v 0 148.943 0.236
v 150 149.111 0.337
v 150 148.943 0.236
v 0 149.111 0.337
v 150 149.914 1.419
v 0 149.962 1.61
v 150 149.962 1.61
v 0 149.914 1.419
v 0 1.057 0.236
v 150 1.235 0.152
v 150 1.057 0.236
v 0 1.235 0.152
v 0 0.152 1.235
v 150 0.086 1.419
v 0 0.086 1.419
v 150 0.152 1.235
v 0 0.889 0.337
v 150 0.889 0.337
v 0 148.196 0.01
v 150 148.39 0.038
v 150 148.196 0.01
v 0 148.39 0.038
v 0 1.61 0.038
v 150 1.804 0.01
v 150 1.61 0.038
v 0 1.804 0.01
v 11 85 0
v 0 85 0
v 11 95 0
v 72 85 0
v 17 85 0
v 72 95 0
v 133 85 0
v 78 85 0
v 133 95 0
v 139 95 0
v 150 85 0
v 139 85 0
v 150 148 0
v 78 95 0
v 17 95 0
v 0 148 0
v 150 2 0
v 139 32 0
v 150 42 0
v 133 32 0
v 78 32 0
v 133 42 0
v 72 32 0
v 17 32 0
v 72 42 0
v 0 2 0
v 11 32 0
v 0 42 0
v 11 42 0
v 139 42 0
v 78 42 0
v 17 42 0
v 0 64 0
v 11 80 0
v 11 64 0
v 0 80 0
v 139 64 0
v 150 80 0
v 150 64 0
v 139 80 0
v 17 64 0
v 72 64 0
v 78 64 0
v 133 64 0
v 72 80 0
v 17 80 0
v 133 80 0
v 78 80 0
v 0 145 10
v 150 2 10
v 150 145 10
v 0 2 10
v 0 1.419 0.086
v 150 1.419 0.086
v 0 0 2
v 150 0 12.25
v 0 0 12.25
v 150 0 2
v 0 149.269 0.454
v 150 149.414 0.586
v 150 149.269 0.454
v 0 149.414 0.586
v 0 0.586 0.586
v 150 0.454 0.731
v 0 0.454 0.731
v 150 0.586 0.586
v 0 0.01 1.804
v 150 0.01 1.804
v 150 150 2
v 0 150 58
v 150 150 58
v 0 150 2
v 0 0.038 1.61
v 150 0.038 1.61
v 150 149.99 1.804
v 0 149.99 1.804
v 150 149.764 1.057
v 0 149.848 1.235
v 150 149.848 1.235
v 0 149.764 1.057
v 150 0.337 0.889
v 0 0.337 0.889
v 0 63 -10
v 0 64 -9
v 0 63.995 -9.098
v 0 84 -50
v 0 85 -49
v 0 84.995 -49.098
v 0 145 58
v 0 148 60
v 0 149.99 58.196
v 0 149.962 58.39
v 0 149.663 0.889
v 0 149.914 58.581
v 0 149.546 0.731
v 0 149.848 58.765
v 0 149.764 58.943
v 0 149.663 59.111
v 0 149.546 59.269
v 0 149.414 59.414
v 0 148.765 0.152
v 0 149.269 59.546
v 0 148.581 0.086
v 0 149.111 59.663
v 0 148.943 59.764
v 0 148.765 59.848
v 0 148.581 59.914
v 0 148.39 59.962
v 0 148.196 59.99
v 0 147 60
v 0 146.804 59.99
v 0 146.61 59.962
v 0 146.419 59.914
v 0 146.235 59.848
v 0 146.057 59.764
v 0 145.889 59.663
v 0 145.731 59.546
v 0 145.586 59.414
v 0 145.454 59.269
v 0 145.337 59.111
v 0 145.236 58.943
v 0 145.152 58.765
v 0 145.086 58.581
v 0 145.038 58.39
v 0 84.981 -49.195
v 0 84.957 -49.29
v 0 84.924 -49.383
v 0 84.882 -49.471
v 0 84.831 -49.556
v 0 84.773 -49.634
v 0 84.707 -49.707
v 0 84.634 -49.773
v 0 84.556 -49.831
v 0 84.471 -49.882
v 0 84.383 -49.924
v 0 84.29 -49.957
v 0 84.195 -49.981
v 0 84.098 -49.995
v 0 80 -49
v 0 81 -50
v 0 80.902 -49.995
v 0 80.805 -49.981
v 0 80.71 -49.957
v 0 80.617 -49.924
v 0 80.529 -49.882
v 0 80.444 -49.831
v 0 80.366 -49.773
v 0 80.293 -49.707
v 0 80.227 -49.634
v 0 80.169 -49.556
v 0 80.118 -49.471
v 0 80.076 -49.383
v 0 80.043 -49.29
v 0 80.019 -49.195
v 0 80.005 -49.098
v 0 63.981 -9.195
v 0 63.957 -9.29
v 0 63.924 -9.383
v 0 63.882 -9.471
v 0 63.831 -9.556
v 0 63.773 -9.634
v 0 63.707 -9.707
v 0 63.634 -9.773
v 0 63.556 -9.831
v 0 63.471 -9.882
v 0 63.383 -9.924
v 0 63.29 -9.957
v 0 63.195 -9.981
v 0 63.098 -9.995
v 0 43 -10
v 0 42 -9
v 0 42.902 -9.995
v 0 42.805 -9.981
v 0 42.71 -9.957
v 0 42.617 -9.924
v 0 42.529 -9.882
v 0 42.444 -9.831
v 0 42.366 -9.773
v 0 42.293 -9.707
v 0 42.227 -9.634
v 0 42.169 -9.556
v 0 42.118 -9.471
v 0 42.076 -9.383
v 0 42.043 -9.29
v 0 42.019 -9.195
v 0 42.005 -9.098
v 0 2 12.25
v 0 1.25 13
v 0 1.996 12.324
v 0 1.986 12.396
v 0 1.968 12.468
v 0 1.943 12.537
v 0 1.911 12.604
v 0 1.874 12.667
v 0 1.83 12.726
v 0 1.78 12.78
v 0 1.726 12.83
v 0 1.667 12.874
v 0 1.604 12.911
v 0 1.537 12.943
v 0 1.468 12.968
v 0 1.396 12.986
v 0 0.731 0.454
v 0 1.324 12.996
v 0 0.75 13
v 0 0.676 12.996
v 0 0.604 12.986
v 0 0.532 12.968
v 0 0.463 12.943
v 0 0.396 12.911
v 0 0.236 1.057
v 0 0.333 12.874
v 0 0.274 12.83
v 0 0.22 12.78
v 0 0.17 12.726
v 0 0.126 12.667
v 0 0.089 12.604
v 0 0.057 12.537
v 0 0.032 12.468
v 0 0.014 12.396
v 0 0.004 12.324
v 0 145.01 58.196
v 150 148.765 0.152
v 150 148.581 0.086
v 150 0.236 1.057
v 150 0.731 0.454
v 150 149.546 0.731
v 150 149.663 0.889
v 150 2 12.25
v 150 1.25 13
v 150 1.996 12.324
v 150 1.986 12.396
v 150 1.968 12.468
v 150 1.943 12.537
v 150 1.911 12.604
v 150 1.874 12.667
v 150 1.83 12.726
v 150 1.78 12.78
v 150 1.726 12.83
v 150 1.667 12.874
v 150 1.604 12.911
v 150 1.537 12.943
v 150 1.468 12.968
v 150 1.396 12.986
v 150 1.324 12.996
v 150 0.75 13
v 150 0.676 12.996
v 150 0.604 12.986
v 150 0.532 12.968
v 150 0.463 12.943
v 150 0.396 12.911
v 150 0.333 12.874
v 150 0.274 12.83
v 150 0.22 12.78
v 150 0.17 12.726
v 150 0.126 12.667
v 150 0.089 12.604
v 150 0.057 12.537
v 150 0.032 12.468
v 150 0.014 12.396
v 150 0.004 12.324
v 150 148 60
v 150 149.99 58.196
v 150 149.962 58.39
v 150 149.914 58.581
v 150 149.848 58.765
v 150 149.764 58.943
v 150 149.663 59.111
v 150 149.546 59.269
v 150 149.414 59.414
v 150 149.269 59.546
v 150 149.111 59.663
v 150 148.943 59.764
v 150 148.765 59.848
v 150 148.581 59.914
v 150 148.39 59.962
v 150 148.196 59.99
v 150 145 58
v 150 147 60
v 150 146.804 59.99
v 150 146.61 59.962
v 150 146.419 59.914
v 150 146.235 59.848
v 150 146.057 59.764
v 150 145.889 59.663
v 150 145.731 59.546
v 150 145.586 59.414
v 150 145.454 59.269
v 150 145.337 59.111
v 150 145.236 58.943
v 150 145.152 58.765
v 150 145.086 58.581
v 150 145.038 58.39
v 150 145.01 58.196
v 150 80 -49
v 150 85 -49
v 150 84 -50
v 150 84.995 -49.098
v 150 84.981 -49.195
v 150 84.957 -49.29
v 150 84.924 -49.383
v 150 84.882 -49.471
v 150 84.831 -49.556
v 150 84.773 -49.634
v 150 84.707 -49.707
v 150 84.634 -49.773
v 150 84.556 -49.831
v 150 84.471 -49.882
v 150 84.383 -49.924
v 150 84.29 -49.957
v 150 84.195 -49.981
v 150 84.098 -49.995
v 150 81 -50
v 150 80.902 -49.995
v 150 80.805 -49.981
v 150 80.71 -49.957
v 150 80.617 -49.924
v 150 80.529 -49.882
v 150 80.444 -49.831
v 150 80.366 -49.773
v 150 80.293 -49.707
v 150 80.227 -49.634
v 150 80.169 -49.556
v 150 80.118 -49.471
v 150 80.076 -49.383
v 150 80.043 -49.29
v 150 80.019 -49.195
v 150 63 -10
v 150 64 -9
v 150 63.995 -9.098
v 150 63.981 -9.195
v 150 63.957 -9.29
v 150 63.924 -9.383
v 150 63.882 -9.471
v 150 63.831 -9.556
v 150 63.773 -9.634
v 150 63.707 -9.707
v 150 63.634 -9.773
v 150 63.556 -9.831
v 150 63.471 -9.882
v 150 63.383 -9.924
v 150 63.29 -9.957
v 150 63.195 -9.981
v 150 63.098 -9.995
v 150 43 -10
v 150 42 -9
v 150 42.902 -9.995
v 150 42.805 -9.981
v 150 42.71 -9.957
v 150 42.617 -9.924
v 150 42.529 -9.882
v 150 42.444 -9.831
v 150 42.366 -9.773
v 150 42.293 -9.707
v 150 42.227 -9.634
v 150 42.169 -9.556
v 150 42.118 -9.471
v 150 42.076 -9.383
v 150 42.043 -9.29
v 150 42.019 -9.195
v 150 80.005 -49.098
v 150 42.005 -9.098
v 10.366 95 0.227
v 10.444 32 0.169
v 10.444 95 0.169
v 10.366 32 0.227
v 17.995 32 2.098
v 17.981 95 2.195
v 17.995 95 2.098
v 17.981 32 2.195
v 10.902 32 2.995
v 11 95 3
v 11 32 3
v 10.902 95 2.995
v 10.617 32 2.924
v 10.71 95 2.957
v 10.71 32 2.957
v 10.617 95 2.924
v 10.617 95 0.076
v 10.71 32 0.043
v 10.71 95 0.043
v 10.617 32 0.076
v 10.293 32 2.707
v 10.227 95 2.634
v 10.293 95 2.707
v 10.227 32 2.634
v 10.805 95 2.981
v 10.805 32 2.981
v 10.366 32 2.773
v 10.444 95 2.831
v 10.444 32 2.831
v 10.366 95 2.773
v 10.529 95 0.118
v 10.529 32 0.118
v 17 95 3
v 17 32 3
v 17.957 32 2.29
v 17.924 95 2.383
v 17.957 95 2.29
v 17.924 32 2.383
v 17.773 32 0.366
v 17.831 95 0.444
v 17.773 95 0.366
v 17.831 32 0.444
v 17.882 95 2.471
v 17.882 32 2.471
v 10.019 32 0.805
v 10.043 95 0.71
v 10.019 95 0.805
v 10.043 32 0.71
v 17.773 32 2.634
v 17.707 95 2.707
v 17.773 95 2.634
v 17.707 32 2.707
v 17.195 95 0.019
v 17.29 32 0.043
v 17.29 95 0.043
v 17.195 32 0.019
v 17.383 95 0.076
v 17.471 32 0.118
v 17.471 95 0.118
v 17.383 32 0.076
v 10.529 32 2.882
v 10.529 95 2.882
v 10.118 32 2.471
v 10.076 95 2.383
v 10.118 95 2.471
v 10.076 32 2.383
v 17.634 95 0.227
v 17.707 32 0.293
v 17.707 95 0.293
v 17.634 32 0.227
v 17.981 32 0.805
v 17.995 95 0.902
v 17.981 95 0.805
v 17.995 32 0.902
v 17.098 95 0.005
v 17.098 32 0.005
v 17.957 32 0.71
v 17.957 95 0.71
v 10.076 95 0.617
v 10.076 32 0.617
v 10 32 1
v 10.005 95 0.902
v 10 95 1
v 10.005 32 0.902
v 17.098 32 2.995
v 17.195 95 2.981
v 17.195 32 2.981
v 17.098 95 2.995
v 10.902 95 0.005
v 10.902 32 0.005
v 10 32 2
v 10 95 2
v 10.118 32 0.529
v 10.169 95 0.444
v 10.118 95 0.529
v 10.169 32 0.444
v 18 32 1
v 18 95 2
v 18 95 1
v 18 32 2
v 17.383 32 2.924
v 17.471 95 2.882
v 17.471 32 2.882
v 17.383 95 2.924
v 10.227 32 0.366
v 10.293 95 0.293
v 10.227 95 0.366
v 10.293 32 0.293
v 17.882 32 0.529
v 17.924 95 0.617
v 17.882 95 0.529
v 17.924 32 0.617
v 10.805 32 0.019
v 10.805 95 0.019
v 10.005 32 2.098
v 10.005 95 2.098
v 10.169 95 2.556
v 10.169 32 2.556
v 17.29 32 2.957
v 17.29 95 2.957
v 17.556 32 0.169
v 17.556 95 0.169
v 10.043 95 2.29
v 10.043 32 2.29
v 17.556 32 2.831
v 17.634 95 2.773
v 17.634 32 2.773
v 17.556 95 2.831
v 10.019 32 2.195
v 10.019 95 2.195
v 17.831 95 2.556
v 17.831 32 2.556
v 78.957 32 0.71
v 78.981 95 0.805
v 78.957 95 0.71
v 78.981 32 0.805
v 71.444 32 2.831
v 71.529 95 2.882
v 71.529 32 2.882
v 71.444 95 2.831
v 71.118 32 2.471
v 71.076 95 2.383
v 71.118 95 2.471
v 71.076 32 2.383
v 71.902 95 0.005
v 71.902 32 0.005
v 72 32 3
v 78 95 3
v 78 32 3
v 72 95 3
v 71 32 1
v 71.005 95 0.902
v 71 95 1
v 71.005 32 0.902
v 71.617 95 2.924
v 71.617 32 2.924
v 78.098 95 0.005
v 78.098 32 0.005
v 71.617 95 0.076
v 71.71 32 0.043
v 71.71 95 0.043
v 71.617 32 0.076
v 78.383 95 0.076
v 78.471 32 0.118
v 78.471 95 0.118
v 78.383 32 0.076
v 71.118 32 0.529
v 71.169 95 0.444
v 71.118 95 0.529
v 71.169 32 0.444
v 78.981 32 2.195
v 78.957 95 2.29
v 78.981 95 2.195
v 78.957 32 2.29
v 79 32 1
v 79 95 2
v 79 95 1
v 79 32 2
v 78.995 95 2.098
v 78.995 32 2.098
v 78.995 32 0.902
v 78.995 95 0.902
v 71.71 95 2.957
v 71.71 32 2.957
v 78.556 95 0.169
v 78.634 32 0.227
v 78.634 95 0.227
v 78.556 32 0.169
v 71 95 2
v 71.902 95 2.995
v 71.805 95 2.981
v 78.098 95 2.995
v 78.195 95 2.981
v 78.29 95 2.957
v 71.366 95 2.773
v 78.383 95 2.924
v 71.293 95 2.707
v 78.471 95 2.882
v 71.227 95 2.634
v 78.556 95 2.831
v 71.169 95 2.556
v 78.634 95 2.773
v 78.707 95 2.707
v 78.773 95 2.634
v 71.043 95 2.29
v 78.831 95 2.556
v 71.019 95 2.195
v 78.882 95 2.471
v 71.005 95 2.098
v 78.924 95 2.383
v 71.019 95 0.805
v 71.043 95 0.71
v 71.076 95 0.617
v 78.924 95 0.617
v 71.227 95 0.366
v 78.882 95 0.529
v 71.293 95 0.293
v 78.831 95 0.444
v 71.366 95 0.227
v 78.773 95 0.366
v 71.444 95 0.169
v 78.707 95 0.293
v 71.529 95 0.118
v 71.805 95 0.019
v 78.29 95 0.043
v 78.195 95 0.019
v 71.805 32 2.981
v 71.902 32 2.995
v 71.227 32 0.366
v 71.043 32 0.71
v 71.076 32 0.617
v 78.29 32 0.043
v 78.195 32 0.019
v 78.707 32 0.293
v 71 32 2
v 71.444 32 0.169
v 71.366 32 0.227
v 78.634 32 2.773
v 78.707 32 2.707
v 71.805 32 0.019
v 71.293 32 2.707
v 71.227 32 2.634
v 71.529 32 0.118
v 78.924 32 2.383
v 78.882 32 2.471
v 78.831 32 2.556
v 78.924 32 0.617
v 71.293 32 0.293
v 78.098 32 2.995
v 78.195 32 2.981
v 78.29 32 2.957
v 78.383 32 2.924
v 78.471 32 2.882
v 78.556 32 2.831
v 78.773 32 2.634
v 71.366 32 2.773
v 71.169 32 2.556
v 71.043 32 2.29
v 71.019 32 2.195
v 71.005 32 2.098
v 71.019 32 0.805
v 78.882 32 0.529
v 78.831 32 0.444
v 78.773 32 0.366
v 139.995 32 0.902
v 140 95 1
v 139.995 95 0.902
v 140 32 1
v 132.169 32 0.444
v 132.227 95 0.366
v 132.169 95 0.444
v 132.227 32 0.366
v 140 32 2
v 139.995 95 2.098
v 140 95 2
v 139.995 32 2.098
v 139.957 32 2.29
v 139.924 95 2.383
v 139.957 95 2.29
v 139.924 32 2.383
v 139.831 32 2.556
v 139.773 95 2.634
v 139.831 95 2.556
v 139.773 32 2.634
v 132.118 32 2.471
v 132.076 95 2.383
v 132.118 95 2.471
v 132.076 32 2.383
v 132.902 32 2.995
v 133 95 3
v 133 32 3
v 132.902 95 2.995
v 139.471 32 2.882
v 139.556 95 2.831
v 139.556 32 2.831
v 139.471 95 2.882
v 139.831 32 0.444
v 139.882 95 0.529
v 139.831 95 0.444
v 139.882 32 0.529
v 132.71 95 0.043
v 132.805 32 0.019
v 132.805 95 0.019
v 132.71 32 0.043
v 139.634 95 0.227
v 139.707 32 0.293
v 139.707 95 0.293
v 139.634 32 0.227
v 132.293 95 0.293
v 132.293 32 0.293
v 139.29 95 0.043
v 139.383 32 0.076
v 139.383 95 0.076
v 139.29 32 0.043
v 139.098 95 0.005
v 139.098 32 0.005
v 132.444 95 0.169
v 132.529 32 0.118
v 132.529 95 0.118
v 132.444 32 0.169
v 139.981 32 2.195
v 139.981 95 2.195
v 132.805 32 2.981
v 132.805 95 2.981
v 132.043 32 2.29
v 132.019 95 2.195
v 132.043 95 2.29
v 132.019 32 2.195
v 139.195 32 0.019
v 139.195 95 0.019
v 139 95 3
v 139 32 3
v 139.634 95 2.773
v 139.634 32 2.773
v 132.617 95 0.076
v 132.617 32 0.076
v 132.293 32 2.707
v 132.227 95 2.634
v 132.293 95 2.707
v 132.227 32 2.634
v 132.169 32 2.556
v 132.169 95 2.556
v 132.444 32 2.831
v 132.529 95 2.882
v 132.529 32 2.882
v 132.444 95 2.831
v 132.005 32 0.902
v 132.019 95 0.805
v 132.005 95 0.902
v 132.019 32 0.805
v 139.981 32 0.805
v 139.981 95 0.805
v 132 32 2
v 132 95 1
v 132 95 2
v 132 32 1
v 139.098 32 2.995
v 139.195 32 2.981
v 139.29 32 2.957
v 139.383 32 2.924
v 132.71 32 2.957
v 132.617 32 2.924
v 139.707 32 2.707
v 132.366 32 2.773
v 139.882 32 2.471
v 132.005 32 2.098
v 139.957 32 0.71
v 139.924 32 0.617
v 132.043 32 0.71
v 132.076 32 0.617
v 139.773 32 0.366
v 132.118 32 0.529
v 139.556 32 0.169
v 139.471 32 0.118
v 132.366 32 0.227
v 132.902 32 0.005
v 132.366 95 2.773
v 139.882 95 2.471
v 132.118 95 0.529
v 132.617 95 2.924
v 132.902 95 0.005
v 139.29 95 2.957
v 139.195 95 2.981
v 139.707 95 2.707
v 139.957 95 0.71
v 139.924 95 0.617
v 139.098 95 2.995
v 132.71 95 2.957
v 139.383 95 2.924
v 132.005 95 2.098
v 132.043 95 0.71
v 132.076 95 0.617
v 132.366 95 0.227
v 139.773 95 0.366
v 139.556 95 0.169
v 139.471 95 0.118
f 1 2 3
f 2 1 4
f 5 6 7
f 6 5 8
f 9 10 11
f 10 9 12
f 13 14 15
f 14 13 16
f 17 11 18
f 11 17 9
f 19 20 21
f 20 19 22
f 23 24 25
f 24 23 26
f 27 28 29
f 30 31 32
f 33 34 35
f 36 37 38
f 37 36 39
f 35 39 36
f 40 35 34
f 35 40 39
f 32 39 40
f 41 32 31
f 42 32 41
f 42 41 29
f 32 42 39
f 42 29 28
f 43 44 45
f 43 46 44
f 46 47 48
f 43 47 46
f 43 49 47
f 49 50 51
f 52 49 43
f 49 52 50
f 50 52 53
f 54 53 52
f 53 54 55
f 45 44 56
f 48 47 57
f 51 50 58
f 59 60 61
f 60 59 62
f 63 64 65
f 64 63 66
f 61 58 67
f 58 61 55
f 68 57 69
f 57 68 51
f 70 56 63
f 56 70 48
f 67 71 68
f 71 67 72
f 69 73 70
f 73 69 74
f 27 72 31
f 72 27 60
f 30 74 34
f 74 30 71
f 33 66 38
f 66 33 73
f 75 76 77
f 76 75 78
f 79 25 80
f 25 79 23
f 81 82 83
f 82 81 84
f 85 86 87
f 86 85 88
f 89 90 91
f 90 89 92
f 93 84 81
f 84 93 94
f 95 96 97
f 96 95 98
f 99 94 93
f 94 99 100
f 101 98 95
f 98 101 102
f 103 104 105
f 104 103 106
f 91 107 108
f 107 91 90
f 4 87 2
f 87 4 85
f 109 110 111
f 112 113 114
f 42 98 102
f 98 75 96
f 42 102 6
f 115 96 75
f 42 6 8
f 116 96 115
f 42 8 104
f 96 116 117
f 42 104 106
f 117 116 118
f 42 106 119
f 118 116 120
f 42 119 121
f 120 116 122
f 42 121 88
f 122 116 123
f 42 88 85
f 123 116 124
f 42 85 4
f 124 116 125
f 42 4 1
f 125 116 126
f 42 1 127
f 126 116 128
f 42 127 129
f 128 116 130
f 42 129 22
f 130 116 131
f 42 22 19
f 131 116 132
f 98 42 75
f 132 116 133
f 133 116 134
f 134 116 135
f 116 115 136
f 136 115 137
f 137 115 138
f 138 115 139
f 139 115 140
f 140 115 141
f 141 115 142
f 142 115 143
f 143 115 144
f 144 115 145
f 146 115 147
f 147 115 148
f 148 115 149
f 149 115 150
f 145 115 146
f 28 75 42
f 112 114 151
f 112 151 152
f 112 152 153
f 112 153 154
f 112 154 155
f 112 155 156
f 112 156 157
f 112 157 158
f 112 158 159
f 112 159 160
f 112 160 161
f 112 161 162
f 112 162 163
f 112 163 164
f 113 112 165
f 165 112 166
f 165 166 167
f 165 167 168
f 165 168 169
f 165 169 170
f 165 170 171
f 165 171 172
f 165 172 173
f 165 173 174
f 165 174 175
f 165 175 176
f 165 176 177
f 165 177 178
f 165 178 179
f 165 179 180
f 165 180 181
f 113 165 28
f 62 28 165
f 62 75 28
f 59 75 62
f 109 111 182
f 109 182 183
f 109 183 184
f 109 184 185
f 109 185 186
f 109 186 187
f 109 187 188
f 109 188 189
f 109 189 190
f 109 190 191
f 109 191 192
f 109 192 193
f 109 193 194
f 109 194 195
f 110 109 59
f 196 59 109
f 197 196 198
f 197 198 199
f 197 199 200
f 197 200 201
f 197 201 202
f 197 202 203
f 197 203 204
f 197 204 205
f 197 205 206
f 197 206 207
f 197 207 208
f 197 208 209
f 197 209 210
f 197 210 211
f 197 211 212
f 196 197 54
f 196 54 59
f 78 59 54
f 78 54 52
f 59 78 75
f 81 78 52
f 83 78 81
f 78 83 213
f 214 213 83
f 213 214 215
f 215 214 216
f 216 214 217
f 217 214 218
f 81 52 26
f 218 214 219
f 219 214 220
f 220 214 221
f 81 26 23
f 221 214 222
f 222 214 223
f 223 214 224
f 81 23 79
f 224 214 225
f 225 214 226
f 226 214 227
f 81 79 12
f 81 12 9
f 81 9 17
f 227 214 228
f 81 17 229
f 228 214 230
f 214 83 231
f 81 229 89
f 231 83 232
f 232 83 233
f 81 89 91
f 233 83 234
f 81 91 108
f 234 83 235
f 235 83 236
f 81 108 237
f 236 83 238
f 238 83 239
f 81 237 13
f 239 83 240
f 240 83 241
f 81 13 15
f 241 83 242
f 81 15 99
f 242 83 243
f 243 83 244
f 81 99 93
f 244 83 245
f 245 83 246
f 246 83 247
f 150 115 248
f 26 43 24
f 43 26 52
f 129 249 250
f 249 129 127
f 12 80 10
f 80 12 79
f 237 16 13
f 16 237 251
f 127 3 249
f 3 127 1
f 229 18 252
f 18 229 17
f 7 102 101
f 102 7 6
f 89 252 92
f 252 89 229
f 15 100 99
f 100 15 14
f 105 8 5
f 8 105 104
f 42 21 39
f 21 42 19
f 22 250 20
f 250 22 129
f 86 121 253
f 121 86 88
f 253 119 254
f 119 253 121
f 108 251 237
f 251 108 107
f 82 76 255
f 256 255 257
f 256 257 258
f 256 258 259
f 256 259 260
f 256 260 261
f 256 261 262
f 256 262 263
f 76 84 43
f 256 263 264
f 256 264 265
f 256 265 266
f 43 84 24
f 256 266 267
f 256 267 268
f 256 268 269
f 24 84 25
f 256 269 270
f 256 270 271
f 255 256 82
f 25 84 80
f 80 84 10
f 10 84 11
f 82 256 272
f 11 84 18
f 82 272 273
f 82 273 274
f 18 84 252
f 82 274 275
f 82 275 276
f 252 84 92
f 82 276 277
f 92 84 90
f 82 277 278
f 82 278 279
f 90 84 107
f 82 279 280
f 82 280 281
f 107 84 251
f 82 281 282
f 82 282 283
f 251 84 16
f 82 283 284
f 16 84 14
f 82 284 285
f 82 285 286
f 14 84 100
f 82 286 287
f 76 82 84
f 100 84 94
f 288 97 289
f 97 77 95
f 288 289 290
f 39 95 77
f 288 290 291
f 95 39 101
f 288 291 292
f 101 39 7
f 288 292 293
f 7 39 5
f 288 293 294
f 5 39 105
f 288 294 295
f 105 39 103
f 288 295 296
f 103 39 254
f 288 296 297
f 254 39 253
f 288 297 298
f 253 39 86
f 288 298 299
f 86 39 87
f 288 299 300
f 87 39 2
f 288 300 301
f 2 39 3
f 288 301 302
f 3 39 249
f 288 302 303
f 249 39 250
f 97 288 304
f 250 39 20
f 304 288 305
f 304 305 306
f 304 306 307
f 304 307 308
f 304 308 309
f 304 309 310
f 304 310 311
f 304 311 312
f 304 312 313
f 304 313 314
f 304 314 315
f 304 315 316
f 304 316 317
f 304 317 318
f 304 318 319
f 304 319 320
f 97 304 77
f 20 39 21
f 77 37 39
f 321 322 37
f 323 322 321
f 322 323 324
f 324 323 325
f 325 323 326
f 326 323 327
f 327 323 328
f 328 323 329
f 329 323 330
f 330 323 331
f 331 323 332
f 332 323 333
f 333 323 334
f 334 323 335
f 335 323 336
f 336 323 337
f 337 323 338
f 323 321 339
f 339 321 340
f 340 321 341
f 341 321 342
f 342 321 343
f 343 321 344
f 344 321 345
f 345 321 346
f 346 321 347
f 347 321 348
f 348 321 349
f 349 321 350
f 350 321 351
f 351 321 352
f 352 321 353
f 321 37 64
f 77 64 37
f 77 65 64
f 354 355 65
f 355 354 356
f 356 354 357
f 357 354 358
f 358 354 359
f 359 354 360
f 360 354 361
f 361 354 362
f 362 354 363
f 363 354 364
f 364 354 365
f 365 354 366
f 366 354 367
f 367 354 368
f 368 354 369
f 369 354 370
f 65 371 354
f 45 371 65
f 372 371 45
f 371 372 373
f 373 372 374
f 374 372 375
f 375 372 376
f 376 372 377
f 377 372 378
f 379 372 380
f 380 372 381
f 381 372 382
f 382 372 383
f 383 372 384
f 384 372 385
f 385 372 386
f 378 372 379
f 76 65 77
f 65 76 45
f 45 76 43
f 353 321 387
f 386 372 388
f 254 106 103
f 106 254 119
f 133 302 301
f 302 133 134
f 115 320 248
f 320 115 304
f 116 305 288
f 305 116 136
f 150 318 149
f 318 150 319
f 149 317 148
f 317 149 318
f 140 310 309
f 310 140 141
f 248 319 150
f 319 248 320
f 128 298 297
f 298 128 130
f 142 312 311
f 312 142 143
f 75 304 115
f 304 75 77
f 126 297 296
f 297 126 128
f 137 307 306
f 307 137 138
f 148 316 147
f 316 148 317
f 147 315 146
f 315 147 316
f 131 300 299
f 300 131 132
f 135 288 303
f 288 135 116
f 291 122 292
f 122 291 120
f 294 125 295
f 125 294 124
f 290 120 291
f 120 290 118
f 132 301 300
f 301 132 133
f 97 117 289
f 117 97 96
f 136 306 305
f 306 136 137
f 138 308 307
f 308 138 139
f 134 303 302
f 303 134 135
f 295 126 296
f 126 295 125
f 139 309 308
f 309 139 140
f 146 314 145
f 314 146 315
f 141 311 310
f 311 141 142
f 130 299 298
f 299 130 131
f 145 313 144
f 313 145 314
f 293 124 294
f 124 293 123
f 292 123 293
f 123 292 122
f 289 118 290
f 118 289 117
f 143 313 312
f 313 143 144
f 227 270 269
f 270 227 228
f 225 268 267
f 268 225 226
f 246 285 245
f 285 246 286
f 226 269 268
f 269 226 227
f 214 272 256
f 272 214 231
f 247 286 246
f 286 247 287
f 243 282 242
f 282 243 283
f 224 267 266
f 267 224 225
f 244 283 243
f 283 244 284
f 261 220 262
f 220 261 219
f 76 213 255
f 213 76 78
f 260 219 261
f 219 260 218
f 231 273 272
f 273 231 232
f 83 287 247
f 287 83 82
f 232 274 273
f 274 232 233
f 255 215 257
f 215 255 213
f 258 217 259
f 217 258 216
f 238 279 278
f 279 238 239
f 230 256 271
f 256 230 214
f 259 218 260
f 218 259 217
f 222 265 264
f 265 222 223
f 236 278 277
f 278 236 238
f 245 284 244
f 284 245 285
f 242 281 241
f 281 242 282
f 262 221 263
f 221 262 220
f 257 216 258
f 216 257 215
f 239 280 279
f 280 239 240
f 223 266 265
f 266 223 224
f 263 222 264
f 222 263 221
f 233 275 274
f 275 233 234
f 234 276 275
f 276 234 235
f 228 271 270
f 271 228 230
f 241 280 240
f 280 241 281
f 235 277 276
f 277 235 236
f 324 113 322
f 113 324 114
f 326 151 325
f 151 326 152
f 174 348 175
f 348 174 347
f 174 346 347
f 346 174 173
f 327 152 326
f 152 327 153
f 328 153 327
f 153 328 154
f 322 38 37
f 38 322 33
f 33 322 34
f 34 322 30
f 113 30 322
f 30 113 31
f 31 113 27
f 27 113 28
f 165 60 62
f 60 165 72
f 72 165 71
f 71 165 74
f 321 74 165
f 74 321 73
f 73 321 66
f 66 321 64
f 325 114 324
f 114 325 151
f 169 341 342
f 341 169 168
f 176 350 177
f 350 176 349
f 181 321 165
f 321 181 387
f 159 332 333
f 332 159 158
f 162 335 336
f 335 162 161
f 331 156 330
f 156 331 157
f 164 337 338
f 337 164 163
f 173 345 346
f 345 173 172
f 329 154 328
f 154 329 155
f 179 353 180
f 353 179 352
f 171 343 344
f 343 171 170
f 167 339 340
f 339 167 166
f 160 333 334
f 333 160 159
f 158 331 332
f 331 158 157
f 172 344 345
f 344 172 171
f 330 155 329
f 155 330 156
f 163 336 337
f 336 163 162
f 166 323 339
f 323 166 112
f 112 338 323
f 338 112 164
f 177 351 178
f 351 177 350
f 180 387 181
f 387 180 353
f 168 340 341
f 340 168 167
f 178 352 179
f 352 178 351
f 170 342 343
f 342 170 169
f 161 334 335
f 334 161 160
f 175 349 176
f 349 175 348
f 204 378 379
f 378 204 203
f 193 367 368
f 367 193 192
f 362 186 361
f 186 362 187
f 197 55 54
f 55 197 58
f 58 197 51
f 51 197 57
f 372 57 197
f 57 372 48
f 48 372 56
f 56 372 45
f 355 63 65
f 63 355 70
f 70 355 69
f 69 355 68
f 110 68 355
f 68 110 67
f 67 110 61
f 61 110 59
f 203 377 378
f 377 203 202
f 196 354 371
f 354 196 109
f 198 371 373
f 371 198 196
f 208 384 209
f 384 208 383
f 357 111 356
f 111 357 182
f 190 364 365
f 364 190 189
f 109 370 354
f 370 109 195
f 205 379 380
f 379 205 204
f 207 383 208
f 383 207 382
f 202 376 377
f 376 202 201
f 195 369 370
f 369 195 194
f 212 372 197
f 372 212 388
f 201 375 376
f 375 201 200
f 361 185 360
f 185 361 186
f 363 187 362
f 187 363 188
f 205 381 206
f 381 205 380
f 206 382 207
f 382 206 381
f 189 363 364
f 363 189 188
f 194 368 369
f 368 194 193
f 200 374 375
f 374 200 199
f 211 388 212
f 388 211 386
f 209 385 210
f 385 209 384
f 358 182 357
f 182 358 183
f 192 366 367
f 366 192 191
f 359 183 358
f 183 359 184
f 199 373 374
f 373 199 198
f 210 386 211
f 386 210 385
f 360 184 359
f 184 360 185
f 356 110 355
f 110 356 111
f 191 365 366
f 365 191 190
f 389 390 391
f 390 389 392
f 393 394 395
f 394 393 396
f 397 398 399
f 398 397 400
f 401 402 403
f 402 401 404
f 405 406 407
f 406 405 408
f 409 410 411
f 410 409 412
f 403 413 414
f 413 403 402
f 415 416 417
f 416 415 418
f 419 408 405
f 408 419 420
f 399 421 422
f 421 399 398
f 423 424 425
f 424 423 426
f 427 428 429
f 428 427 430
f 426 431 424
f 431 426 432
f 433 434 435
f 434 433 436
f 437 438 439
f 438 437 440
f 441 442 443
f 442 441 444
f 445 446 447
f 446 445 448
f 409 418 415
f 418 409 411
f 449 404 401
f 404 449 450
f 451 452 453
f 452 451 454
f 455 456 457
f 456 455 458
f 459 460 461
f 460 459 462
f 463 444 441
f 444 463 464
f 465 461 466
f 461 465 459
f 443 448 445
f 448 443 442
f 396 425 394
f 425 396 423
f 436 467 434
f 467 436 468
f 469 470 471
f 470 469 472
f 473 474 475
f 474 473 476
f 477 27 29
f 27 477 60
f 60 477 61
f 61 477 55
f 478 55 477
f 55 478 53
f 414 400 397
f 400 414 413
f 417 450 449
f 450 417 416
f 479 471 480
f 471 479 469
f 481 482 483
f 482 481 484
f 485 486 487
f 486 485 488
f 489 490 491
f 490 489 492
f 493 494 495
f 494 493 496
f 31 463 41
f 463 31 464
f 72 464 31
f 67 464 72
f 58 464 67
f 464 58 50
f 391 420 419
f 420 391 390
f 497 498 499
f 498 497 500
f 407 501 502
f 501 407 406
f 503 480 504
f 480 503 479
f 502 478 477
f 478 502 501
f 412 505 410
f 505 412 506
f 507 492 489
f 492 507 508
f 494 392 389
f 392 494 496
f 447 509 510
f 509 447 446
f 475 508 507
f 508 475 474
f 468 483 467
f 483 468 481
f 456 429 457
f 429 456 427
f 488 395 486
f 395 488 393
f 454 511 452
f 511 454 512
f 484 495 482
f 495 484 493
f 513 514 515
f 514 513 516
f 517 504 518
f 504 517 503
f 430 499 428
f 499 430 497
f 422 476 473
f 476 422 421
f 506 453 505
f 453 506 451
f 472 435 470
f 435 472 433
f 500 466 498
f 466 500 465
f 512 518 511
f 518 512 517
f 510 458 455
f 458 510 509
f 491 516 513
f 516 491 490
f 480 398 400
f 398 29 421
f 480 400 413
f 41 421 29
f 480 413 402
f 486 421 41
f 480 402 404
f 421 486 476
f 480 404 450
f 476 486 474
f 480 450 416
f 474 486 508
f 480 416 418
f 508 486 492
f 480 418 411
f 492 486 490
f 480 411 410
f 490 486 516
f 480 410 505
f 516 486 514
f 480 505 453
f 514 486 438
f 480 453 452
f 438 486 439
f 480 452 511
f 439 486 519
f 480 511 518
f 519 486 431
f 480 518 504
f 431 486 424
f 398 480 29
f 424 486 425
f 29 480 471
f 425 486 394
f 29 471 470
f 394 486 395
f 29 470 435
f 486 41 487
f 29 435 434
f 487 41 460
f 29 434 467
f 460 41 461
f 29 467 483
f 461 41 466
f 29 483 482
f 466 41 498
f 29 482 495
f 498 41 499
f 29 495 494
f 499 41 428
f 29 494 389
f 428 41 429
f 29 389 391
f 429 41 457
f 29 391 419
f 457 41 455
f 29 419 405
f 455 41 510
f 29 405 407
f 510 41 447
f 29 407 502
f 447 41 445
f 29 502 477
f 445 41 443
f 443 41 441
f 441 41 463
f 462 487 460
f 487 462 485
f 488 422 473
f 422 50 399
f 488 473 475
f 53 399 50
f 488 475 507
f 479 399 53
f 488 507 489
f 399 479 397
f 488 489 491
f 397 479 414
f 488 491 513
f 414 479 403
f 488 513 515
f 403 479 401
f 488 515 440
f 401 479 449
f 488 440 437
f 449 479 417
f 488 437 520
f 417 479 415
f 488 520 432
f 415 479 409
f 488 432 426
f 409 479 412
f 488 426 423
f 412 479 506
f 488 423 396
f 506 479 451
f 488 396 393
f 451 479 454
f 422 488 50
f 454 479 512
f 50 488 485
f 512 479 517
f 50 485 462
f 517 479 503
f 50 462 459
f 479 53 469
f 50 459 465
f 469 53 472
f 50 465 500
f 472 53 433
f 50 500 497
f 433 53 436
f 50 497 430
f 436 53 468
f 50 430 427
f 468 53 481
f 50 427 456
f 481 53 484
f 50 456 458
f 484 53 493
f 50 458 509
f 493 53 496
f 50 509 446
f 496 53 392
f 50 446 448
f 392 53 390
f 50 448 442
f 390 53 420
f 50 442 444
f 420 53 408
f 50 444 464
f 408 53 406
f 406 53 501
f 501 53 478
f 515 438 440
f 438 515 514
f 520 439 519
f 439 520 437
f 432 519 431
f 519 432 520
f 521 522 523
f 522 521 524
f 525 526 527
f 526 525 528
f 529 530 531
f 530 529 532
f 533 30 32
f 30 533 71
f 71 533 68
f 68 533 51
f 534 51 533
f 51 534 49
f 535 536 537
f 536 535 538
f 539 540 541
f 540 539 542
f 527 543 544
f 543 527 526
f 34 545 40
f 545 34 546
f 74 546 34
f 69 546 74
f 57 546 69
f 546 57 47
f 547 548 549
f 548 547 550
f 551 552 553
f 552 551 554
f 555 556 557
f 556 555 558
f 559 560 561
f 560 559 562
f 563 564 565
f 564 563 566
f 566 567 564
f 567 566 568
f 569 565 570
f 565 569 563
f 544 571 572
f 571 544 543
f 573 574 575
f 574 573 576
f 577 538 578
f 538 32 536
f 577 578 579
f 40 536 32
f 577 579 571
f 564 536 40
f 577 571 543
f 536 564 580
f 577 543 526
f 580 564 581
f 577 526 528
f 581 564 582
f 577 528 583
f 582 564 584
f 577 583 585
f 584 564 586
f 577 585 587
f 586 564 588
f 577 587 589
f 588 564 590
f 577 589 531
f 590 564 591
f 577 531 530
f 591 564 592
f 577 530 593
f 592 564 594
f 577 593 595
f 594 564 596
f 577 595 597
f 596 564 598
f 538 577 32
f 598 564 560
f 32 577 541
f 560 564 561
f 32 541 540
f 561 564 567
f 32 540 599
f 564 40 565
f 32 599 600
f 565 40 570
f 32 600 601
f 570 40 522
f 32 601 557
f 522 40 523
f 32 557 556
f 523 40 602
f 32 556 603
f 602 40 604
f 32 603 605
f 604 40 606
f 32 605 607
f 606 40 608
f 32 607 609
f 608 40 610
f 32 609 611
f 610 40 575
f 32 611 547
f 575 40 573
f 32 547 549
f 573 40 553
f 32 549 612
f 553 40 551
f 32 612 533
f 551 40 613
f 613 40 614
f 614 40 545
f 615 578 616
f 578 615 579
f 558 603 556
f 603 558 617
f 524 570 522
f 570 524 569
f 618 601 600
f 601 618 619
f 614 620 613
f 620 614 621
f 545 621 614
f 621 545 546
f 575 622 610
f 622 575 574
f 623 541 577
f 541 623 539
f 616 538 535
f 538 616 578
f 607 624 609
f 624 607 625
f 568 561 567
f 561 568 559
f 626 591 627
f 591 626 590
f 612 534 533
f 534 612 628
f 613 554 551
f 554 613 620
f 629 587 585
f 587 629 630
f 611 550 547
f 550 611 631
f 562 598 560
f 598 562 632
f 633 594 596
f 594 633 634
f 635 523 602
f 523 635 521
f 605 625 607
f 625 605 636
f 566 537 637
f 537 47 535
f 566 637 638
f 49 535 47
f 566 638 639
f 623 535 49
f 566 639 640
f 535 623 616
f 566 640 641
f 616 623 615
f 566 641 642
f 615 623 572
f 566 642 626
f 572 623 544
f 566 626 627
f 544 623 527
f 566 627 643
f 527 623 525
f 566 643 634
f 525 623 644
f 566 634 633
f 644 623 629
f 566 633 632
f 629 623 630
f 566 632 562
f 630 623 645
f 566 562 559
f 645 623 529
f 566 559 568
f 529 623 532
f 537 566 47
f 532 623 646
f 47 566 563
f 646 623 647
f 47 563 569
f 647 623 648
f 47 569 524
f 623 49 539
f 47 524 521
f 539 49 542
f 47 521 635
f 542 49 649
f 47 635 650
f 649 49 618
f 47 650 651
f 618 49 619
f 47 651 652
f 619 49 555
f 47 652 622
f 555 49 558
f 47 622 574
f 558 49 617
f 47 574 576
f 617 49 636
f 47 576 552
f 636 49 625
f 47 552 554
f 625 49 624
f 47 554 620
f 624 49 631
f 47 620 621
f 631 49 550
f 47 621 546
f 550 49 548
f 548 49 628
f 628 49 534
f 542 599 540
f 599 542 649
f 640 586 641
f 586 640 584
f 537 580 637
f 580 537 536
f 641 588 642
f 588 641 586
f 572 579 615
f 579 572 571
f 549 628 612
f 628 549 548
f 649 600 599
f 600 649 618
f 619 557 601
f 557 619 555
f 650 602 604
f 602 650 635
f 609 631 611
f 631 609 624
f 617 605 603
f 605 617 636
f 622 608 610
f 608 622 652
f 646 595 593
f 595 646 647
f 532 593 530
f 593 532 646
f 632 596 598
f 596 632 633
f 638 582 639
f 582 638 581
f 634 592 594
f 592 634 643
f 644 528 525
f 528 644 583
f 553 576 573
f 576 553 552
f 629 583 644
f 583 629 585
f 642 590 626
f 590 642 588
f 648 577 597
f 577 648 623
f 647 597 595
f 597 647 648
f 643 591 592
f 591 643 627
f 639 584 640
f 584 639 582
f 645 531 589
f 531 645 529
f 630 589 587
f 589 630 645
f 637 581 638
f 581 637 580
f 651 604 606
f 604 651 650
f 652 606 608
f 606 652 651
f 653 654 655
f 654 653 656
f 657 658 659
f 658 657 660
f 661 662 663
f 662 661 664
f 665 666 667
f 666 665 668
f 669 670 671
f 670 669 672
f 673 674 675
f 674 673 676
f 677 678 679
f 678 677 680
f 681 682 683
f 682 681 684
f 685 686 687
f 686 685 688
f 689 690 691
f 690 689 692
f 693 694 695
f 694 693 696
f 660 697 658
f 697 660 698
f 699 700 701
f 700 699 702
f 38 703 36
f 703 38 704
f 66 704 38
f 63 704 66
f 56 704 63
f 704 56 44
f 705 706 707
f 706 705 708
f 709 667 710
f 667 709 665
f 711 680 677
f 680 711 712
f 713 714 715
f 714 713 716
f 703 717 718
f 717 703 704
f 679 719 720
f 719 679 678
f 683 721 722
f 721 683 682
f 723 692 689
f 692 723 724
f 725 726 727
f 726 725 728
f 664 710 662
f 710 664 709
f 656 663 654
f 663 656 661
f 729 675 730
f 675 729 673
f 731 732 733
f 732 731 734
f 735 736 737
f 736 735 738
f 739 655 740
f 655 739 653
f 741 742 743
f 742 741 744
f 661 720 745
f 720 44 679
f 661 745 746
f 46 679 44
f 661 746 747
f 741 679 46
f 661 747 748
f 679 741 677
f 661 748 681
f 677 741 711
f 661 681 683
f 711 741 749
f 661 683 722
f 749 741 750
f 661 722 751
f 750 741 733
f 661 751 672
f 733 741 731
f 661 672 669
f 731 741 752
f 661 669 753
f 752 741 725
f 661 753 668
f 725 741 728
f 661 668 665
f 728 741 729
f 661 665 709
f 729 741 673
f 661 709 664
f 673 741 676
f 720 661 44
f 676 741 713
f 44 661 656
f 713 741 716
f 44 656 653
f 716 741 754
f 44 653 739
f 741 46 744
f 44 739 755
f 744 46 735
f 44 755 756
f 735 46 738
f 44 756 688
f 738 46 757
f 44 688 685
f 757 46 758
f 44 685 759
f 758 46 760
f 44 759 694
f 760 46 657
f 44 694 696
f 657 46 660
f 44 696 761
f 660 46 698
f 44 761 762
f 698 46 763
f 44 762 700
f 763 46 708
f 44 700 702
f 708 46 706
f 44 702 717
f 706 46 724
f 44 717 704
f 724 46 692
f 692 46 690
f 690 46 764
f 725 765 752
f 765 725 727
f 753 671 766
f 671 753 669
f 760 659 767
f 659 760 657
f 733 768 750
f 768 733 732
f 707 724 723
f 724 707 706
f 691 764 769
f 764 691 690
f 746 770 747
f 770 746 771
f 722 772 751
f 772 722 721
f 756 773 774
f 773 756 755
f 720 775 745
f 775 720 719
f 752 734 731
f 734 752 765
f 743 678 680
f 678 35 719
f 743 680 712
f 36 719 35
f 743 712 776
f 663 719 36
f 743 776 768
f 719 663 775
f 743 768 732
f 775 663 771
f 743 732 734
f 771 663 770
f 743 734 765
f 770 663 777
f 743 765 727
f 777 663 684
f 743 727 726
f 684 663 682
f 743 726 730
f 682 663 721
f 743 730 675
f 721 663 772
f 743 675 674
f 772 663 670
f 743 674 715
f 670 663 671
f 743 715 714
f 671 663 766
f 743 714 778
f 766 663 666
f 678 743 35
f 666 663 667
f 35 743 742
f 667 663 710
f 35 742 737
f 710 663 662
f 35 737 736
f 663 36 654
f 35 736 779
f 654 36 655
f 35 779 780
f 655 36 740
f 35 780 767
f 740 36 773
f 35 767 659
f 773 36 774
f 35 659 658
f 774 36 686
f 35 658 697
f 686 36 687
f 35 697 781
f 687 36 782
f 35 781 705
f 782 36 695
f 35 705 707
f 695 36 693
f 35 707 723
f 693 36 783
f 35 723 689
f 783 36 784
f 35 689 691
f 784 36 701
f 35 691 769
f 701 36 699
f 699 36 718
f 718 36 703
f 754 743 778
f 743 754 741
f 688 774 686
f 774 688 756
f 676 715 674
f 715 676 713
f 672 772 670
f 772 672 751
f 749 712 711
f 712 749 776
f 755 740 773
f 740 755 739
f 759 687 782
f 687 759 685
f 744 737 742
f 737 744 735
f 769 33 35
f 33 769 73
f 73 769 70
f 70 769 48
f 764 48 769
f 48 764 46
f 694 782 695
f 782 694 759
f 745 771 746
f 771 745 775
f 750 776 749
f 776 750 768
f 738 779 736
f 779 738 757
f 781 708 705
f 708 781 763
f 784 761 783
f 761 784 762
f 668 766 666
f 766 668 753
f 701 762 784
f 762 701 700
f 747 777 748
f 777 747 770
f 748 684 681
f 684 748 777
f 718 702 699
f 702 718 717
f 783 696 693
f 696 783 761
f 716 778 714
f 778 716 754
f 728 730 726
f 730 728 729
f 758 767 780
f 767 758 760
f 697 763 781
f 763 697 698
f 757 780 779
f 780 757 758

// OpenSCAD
/**
 * bar_shelf.scad — One-off shelf designed to fit over a bar.
 *
 * Coordinate System:
 *   X = Width  (positive = right) — across the shelf
 *   Y = Depth  (positive = back)  — front (Y=0) to back (Y=shelf_depth_mm)
 *   Z = Height (positive = up)
 *
 * Origin: Front-left-bottom corner of the shelf body.
 *   - Top of the shelf surface is at Z = shelf_thickness_mm.
 *   - Drop walls hang below the shelf at negative Z.
 *   - Back wall stands above the shelf at Z > shelf_thickness_mm.
 *
 * COMPONENT INDEX
 *
 * | Component    | Origin [X,Y,Z]   | Size [W,D,H]      | Attaches To       |
 * |--------------|------------------|-------------------|-------------------|
 * | shelf_body   | [0,    0,    0]  | [25.4, 150,  10]  | (sits on bar)     |
 * | back_wall    | [0,  145,   10]  | [25.4,   5,  50]  | shelf_body top    |
 * | front_ledge  | [0,    0,   10]  | [25.4,   2,   3]  | shelf_body top    |
 * | drop_wall_a  | [0,   80,  -50]  | [25.4,   5,  50]  | shelf_body bottom |
 * | drop_wall_b  | [0,   42,  -10]  | [25.4,  22,  10]  | shelf_body bottom |
 */

$fn = 64;

// ===========================================
// DIMENSIONS (all values in millimeters)
// ===========================================

// --- shelf body ---
// shelf_width_mm and shelf_depth_mm can be overridden by a wrapper file by
// setting `shelf_width_override` / `shelf_depth_override` BEFORE doing
// `include<bar_shelf.scad>`.
shelf_width_mm     = is_undef(shelf_width_override) ? 150 : shelf_width_override;
shelf_depth_mm     = is_undef(shelf_depth_override) ? 150 : shelf_depth_override;
shelf_thickness_mm = 10;
shelf_bottom_round_mm = 2;   // Fillet on bottom-front and bottom-back edges

// --- back wall (above shelf) ---
back_wall_height_mm    = 50;
back_wall_thickness_mm = 5;
back_wall_top_round_mm = 2;  // Round on top edges

// --- front ledge (small lip on top of shelf, front edge) ---
front_ledge_depth_mm  = 2;   // Y dimension
front_ledge_height_mm = 3;   // Z dimension above shelf top
front_ledge_round_mm  = 0.75;

// --- drop wall A (rear drop wall, hangs below shelf) ---
// "65mm from the back edge": back face of wall A is 65mm in from the shelf's back edge.
drop_a_offset_from_back_mm = 65;
drop_a_thickness_mm = 5;   // Y dimension
rear_wall_height_mm = is_undef(rear_wall_height_override) ? 50 : rear_wall_height_override;
drop_a_round_mm     = 1;   // Edge fillet

// --- front border (the front lip / bar feature the shelf catches on) ---
// border_ridge_mm  = front-to-back thickness of the bar where it sits between
//                    the two drop walls (was: drop_b_gap_to_a_mm).
// border_depth_mm  = Y-thickness of the front drop wall (was: drop_b_thickness_mm).
// border_height_mm = how far the front drop wall hangs below the shelf
//                    (was: drop_b_drop_mm).
border_ridge_mm  = is_undef(border_ridge_override)  ? 16 : border_ridge_override;
border_depth_mm  = is_undef(border_depth_override)  ? 22 : border_depth_override;
border_height_mm = is_undef(border_height_override) ? 10 : border_height_override;
drop_b_round_mm  = 1;

// --- zip tie slots (three slots under the shelf) ---
// Each slot is 8mm wide (X) by 3mm high (Z), running in Y from 10mm before
// the front-most drop wall to 10mm after the rear-most drop wall. Each
// slot's bottom is flush with the shelf bottom (Z = 0) and opens through
// the underside. Long edges (running in Y) are rounded with radius 1mm.
//
// There are three slots: one 10mm from the left edge, one centered in X,
// and one 10mm from the right edge.
zip_tie_slot_x_mm     = 8;   // X dimension of each slot
zip_tie_slot_z_mm     = 3;   // Z dimension of each slot
zip_tie_round_mm      = 1;
zip_tie_offset_mm     = 10;  // Distance between slot Y end and nearest wall face
zip_tie_edge_inset_mm = 10;  // Distance from shelf X edge to outer slot edge

// --- derived Y positions for drop walls (Y=0 = front, Y=shelf_depth_mm = back) ---
drop_a_back_y  = shelf_depth_mm - drop_a_offset_from_back_mm;   // 85
drop_a_front_y = drop_a_back_y  - drop_a_thickness_mm;          // 80
drop_b_back_y  = drop_a_front_y - border_ridge_mm;              // 64
drop_b_front_y = drop_b_back_y  - border_depth_mm;              // 42

// --- derived positions for the zip tie slots ---
zip_tie_slot_y_front = drop_b_front_y - zip_tie_offset_mm;  // 32
zip_tie_slot_y_back  = drop_a_back_y  + zip_tie_offset_mm;  // 95

// ===========================================
// MODULES
// ===========================================

/**
 * shelf_body
 *
 * Position:    Origin [0, 0, 0]
 * Bounding:    [0, 0, 0] to [25.4, 150, 10]
 * Notes:       Bottom-front and bottom-back edges are filleted with radius
 *              shelf_bottom_round_mm. Top is left sharp so the back_wall and
 *              front_ledge meet it cleanly. Two zip-tie slots are subtracted
 *              from the body (running through the full X width).
 */
module shelf_body() {
    r = shelf_bottom_round_mm;
    hull() {
        // Bottom-front rounded edge: cylinder running along X
        translate([0, r, r])
            rotate([0, 90, 0])
                cylinder(h=shelf_width_mm, r=r);
        // Bottom-back rounded edge
        translate([0, shelf_depth_mm - r, r])
            rotate([0, 90, 0])
                cylinder(h=shelf_width_mm, r=r);
        // Top-front sharp edge
        translate([0, 0, shelf_thickness_mm - 0.01])
            cube([shelf_width_mm, 0.01, 0.01]);
        // Top-back sharp edge
        translate([0, shelf_depth_mm - 0.01, shelf_thickness_mm - 0.01])
            cube([shelf_width_mm, 0.01, 0.01]);
    }
}

/**
 * zip_tie_slot — one rounded zip-tie channel located at X=[x_min, x_min+W].
 *
 * Cross-section is zip_tie_slot_x_mm (X) by zip_tie_slot_z_mm (Z); bottom
 * flush with shelf bottom (Z = 0); long edges rounded with zip_tie_round_mm.
 * Runs in Y from zip_tie_slot_y_front to zip_tie_slot_y_back.
 */
module zip_tie_slot(x_min) {
    r = zip_tie_round_mm;
    x_max = x_min + zip_tie_slot_x_mm;
    z_max = zip_tie_slot_z_mm;
    y_len = zip_tie_slot_y_back - zip_tie_slot_y_front;
    hull() {
        for (x = [x_min + r, x_max - r], z = [r, z_max - r]) {
            translate([x, zip_tie_slot_y_front, z])
                rotate([-90, 0, 0])
                    cylinder(h = y_len, r = r);
        }
    }
}

/**
 * zip_tie_slots — three slots: 10mm from left, centered, 10mm from right.
 */
module zip_tie_slots() {
    zip_tie_slot(zip_tie_edge_inset_mm);                                          // left
    zip_tie_slot((shelf_width_mm - zip_tie_slot_x_mm) / 2);                       // middle
    zip_tie_slot(shelf_width_mm - zip_tie_edge_inset_mm - zip_tie_slot_x_mm);     // right
}

/**
 * back_wall
 *
 * Position:    Origin [0, shelf_depth_mm - back_wall_thickness_mm, shelf_thickness_mm]
 * Bounding:    [0, 145, 10] to [25.4, 150, 60]
 * Notes:       Sits flush on top of the rear edge of the shelf.
 *              Top edges (front-top and back-top, running along X) are rounded.
 *              Bottom is sharp where it meets the shelf top.
 */
module back_wall() {
    r = back_wall_top_round_mm;
    base_z = shelf_thickness_mm;
    top_z  = base_z + back_wall_height_mm;
    front_y = shelf_depth_mm - back_wall_thickness_mm;
    back_y  = shelf_depth_mm;

    hull() {
        // Bottom slab — sharp, sits on shelf top
        translate([0, front_y, base_z])
            cube([shelf_width_mm, back_wall_thickness_mm, 0.01]);
        // Top-front rounded edge: cylinder along X
        translate([0, front_y + r, top_z - r])
            rotate([0, 90, 0])
                cylinder(h=shelf_width_mm, r=r);
        // Top-back rounded edge
        translate([0, back_y - r, top_z - r])
            rotate([0, 90, 0])
                cylinder(h=shelf_width_mm, r=r);
    }
}

/**
 * front_ledge
 *
 * Position:    Origin [0, 0, shelf_thickness_mm]
 * Bounding:    [0, 0, 10] to [25.4, 2, 13]
 * Notes:       Small upturned lip along the front edge of the shelf to keep
 *              items from sliding off. 3mm tall, 2mm thick (Y), with rounded
 *              top edges.
 */
module front_ledge() {
    r = front_ledge_round_mm;
    base_z = shelf_thickness_mm;
    top_z  = base_z + front_ledge_height_mm;

    hull() {
        // Bottom — sharp, flush with shelf top
        translate([0, 0, base_z])
            cube([shelf_width_mm, front_ledge_depth_mm, 0.01]);
        // Top-front rounded edge
        translate([0, r, top_z - r])
            rotate([0, 90, 0])
                cylinder(h=shelf_width_mm, r=r);
        // Top-back rounded edge
        translate([0, front_ledge_depth_mm - r, top_z - r])
            rotate([0, 90, 0])
                cylinder(h=shelf_width_mm, r=r);
    }
}

/**
 * drop_wall — generic hanging wall under the shelf with rounded bottom edges.
 *
 * Top of the wall extends slightly UP into the shelf body to ensure a clean
 * union with shelf_body (no flicker / no rounded top corners visible).
 */
module drop_wall(y_front, y_back, drop, r) {
    overlap = 2;  // Extends into shelf body for clean union
    hull() {
        // Bottom-front rounded edge
        translate([0, y_front + r, -drop + r])
            rotate([0, 90, 0])
                cylinder(h=shelf_width_mm, r=r);
        // Bottom-back rounded edge
        translate([0, y_back - r, -drop + r])
            rotate([0, 90, 0])
                cylinder(h=shelf_width_mm, r=r);
        // Top — sharp, extends into shelf
        translate([0, y_front, overlap - 0.01])
            cube([shelf_width_mm, y_back - y_front, 0.01]);
    }
}

/**
 * drop_wall_a (rear drop wall)
 *
 * Position:   [0, drop_a_front_y, -rear_wall_height_mm]
 * Bounding:   [0, 80, -50] to [25.4, 85, 0]
 */
module drop_wall_a() {
    drop_wall(drop_a_front_y, drop_a_back_y, rear_wall_height_mm, drop_a_round_mm);
}

/**
 * drop_wall_b (front drop wall)
 *
 * Position:   [0, drop_b_front_y, -border_height_mm]
 * Bounding:   [0, 42, -10] to [25.4, 64, 0]
 */
module drop_wall_b() {
    drop_wall(drop_b_front_y, drop_b_back_y, border_height_mm, drop_b_round_mm);
}

// ===========================================
// DEBUG / VISUALIZATION
// ===========================================

module debug_axes(length = 50) {
    color("red")   cylinder(h=length, r=1, $fn=16);                  // Z
    color("green") rotate([0,90,0])  cylinder(h=length, r=1, $fn=16);// X
    color("blue")  rotate([-90,0,0]) cylinder(h=length, r=1, $fn=16);// Y
}

module assembly_colored() {
    color("gray")    shelf_body();
    color("steelblue") back_wall();
    color("gold")    front_ledge();
    color("orange")  drop_wall_a();
    color("orange")  drop_wall_b();
}

// ===========================================
// ASSEMBLY
// ===========================================

module assembly() {
    difference() {
        union() {
            shelf_body();
            back_wall();
            front_ledge();
            drop_wall_a();
            drop_wall_b();
        }
        zip_tie_slots();
    }
}

assembly();
